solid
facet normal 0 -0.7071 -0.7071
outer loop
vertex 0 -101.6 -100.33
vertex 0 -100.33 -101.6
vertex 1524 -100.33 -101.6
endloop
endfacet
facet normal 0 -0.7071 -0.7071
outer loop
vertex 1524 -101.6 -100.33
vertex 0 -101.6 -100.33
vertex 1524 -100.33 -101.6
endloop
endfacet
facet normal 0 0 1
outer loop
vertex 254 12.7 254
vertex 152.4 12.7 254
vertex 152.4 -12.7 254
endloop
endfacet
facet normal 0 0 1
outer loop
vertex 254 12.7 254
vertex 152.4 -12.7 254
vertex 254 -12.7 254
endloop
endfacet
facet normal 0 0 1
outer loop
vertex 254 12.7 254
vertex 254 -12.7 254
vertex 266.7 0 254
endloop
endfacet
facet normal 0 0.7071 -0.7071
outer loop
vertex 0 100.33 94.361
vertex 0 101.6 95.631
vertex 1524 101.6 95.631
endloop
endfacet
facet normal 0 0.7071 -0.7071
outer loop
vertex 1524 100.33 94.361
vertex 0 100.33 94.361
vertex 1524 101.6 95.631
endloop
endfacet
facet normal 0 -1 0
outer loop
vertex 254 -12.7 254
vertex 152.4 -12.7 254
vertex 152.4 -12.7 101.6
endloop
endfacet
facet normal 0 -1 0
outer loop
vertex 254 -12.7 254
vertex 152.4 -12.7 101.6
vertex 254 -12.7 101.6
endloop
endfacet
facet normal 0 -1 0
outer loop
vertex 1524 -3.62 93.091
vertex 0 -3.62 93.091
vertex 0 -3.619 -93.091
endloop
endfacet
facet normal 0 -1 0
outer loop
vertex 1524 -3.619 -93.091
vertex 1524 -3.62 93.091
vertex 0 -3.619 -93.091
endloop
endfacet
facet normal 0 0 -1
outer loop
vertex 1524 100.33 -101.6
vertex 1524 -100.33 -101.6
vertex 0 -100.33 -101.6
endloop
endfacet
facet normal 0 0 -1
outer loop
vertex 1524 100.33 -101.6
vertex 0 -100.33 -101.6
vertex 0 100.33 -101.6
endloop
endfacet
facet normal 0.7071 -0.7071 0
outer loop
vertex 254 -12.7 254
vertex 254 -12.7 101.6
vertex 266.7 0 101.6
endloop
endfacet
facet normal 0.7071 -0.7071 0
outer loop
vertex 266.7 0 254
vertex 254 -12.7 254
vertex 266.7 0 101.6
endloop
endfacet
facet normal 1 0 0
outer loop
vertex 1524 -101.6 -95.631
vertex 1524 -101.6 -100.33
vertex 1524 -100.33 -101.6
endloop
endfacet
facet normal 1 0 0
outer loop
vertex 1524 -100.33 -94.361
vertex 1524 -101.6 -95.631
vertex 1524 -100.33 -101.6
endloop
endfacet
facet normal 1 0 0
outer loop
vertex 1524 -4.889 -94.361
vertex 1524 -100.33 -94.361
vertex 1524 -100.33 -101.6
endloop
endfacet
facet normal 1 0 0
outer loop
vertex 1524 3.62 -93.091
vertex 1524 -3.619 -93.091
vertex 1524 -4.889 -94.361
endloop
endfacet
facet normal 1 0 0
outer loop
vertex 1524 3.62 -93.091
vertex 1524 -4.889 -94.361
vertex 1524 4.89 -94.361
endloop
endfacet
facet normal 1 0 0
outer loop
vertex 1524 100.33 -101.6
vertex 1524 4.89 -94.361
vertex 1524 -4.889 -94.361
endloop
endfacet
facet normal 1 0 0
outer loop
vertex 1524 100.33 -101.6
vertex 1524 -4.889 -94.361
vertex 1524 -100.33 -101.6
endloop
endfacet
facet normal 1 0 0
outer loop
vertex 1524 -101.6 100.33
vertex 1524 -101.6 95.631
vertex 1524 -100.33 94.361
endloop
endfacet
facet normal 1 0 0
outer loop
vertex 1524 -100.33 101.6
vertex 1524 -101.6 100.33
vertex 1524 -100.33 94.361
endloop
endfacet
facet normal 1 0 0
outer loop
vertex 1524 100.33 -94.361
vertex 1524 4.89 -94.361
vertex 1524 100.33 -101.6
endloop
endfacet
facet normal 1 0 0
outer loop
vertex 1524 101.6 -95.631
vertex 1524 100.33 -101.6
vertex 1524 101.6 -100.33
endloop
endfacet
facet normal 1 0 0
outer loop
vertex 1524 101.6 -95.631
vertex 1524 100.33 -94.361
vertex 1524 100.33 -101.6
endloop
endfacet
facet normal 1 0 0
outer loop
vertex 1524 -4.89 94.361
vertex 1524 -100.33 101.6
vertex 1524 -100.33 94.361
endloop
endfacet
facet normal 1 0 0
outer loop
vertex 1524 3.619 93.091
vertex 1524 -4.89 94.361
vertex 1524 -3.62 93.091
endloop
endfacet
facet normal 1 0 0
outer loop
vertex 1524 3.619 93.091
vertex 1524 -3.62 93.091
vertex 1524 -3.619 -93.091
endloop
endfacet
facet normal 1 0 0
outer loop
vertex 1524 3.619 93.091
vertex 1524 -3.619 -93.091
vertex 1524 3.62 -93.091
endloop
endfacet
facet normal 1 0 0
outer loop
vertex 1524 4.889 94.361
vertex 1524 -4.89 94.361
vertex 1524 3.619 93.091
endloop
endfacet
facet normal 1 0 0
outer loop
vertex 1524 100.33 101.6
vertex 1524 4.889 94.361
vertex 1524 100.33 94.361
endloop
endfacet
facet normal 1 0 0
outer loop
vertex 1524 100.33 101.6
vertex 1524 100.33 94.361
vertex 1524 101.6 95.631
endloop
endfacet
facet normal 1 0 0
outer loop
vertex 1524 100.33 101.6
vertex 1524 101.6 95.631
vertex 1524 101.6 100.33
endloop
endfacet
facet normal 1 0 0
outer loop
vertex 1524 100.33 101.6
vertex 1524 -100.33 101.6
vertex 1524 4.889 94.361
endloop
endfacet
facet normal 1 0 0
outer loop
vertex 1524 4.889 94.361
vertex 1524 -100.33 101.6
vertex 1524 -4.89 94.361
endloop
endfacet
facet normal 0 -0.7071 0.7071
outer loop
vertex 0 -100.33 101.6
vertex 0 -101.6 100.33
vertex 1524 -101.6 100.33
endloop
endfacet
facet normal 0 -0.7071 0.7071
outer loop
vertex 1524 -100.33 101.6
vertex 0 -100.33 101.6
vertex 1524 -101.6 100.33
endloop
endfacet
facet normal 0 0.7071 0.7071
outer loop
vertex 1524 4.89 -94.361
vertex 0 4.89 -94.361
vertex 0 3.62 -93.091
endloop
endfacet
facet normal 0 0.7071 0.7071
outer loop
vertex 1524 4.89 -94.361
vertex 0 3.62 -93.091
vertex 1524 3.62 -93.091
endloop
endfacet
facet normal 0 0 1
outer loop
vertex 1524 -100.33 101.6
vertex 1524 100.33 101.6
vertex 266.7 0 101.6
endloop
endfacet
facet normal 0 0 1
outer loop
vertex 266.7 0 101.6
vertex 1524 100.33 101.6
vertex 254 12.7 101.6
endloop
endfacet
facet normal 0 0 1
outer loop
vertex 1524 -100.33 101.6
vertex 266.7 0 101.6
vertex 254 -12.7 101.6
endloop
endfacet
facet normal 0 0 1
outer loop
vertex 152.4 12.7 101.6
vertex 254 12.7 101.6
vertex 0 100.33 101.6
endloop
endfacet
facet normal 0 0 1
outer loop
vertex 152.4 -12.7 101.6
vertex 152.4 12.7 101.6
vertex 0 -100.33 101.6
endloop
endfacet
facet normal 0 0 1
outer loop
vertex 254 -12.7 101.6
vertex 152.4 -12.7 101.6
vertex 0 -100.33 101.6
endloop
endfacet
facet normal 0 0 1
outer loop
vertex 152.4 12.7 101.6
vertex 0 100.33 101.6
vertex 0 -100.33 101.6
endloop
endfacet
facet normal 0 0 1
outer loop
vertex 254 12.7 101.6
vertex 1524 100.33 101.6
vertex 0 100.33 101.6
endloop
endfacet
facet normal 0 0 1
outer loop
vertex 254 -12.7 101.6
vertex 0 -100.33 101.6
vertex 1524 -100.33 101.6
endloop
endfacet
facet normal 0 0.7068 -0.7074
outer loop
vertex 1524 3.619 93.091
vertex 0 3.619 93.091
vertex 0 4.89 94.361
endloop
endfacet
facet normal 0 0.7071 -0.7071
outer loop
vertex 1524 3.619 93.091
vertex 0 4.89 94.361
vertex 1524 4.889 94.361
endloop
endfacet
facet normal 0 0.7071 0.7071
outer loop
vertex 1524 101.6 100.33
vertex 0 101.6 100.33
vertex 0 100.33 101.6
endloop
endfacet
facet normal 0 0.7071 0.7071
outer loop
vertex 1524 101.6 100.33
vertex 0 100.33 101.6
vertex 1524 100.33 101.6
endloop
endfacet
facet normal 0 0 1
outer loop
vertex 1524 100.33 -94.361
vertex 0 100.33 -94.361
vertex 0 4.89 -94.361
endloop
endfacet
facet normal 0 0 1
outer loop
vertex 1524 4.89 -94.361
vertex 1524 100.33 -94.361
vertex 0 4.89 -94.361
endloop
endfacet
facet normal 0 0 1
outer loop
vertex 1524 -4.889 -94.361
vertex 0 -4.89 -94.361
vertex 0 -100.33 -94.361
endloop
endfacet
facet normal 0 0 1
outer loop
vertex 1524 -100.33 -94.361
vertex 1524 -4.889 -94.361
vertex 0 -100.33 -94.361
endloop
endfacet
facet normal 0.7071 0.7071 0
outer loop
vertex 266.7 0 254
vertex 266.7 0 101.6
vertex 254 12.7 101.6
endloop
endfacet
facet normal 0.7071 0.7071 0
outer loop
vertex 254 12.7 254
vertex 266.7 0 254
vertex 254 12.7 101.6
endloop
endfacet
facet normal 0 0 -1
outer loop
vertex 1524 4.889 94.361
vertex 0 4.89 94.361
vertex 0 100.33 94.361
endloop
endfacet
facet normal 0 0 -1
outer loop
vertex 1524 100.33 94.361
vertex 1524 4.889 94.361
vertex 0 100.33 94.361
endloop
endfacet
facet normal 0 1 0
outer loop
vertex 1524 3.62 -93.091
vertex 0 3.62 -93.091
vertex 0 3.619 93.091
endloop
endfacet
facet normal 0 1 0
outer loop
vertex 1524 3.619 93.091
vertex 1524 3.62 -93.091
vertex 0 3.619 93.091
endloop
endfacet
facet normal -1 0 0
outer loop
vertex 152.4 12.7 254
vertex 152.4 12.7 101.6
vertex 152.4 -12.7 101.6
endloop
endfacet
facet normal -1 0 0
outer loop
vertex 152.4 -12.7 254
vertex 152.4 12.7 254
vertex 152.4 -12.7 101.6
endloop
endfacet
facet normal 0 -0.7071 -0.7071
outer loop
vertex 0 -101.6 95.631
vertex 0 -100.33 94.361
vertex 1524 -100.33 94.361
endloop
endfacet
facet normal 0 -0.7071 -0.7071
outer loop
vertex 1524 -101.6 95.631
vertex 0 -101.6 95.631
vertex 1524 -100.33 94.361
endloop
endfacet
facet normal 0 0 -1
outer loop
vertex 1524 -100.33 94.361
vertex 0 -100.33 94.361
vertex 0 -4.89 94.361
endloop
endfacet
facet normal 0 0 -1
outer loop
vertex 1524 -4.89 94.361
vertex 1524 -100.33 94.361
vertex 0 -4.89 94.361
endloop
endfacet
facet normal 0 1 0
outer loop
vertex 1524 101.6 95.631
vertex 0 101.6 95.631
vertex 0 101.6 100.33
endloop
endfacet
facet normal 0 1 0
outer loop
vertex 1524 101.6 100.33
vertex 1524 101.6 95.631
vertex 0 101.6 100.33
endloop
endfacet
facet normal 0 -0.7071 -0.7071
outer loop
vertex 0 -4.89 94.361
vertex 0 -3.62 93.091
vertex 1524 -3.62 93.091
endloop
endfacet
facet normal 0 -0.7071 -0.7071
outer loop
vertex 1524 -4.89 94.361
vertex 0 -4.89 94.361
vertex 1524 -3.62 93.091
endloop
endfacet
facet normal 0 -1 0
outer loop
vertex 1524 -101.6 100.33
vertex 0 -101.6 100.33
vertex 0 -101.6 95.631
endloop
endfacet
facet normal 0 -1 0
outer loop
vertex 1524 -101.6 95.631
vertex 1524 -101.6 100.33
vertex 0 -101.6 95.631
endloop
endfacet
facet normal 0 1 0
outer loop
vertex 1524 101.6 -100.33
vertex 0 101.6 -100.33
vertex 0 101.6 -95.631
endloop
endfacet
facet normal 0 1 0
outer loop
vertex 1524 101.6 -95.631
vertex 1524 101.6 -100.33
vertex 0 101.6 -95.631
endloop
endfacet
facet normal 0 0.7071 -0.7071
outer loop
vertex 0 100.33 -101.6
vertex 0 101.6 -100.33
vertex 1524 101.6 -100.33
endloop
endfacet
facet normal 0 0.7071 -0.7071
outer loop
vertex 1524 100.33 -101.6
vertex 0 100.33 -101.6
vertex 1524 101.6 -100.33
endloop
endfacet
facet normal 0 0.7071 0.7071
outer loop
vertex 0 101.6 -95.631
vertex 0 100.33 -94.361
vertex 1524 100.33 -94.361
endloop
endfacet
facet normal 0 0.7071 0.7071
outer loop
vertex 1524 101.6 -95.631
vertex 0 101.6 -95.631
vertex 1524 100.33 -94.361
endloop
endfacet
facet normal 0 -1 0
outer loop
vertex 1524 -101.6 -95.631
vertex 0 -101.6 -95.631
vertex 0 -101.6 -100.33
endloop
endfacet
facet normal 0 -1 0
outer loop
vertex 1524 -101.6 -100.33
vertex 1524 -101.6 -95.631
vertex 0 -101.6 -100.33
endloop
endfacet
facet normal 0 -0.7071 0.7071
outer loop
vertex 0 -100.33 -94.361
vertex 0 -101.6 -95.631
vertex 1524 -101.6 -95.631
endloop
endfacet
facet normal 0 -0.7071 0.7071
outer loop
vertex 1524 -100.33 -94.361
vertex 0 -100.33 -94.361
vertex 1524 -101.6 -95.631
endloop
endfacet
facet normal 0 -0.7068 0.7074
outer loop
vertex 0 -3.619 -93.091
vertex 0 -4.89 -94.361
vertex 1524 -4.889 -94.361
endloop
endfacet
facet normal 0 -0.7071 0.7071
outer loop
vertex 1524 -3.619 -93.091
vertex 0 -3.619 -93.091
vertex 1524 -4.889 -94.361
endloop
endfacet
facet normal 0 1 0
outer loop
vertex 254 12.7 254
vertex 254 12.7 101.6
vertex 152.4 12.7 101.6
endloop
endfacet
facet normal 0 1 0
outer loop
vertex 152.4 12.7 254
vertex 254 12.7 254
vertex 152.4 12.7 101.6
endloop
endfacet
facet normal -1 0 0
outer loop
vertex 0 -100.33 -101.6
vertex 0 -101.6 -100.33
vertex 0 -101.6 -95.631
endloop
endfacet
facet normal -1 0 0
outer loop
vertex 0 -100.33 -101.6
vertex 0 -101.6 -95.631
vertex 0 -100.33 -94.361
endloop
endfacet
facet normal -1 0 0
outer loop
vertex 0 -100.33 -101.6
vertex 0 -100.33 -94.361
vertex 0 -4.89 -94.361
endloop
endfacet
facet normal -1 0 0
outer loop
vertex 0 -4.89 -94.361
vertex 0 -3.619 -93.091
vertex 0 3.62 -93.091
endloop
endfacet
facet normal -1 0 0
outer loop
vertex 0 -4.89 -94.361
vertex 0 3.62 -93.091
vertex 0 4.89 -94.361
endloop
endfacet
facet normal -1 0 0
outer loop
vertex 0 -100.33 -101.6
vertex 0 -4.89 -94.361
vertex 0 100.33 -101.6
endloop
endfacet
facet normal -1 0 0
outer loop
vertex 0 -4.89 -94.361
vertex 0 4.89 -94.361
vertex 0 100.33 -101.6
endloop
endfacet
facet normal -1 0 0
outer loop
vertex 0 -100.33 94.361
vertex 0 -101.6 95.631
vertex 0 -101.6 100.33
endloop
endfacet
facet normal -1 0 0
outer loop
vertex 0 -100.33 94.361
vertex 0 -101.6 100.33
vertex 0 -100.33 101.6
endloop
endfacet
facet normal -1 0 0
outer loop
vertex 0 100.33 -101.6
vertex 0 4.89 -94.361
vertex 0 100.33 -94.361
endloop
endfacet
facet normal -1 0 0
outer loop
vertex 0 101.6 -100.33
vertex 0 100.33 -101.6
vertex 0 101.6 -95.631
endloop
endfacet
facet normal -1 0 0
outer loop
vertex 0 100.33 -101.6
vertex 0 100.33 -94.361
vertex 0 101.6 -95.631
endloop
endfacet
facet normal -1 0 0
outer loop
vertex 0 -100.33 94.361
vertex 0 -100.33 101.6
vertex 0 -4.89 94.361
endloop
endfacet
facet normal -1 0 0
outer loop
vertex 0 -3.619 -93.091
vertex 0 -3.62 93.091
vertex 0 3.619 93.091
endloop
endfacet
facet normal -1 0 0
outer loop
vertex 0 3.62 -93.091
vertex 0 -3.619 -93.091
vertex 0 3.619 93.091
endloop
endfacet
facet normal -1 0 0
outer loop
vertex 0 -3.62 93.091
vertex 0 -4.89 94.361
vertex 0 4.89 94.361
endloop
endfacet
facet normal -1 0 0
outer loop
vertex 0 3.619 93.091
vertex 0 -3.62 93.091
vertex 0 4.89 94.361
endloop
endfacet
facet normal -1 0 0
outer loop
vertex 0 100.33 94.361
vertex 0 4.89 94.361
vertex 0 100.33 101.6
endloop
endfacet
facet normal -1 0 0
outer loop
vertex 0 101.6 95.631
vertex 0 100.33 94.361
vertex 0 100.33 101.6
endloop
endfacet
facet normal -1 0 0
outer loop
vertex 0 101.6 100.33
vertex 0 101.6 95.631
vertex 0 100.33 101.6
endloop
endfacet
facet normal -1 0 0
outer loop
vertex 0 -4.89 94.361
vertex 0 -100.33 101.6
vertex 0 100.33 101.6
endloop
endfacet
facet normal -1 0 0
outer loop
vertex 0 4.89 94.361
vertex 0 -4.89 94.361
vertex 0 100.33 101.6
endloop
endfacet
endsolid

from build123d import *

# Parameters (mm, degrees)
F1_DEPTH = 1524
F2_SIZE  = 1.27
F3_SIZE  = 1.27
F5_DEPTH = 152.4


with BuildPart() as f1:
    # F0 (on Right) → F1 (new body)
    with BuildSketch(Plane.YZ):
        Polygon((101.6, 101.6), (-101.6, 101.6), (-101.6, 94.361), (-3.6195, 94.361), (-3.6195, 0), (0, 0), (3.6195, 0), (3.6195, 94.361), (101.6, 94.361), align=None)
        Polygon((0, 0), (-3.6195, 0), (-3.6195, -94.361), (-101.6, -94.361), (-101.6, -101.6), (101.6, -101.6), (101.6, -94.361), (3.6195, -94.361), (3.6195, 0), align=None)
    extrude(amount=F1_DEPTH)

    # F2
    f2_edges = [f1.edges().sort_by_distance(p)[0] for p in [
        (762, -101.6, 101.6),
        (762, -101.6, 94.361),
        (762, 101.6, 101.6),
        (762, 101.6, 94.361),
        (762, 101.6, -94.361),
        (762, 101.6, -101.6),
        (762, -101.6, -94.361),
        (762, -101.6, -101.6),
    ]]
    chamfer(f2_edges, length=F2_SIZE)

    # F3
    f3_edges = [f1.edges().sort_by_distance(p)[0] for p in [
        (762, -3.6195, 94.361),
        (762, 3.6195, 94.361),
        (762, 3.6195, -94.361),
        (762, -3.6195, -94.361),
    ]]
    chamfer(f3_edges, length=F3_SIZE)

    # F4 (on face) → F5 (join)
    with BuildSketch(Plane.XY.offset(101.6)):
        Polygon((152.4, 12.7), (152.4, -12.7), (254, -12.7), (266.7, 0), (254, 12.7), align=None)
    extrude(amount=F5_DEPTH)


solid = f1.part
